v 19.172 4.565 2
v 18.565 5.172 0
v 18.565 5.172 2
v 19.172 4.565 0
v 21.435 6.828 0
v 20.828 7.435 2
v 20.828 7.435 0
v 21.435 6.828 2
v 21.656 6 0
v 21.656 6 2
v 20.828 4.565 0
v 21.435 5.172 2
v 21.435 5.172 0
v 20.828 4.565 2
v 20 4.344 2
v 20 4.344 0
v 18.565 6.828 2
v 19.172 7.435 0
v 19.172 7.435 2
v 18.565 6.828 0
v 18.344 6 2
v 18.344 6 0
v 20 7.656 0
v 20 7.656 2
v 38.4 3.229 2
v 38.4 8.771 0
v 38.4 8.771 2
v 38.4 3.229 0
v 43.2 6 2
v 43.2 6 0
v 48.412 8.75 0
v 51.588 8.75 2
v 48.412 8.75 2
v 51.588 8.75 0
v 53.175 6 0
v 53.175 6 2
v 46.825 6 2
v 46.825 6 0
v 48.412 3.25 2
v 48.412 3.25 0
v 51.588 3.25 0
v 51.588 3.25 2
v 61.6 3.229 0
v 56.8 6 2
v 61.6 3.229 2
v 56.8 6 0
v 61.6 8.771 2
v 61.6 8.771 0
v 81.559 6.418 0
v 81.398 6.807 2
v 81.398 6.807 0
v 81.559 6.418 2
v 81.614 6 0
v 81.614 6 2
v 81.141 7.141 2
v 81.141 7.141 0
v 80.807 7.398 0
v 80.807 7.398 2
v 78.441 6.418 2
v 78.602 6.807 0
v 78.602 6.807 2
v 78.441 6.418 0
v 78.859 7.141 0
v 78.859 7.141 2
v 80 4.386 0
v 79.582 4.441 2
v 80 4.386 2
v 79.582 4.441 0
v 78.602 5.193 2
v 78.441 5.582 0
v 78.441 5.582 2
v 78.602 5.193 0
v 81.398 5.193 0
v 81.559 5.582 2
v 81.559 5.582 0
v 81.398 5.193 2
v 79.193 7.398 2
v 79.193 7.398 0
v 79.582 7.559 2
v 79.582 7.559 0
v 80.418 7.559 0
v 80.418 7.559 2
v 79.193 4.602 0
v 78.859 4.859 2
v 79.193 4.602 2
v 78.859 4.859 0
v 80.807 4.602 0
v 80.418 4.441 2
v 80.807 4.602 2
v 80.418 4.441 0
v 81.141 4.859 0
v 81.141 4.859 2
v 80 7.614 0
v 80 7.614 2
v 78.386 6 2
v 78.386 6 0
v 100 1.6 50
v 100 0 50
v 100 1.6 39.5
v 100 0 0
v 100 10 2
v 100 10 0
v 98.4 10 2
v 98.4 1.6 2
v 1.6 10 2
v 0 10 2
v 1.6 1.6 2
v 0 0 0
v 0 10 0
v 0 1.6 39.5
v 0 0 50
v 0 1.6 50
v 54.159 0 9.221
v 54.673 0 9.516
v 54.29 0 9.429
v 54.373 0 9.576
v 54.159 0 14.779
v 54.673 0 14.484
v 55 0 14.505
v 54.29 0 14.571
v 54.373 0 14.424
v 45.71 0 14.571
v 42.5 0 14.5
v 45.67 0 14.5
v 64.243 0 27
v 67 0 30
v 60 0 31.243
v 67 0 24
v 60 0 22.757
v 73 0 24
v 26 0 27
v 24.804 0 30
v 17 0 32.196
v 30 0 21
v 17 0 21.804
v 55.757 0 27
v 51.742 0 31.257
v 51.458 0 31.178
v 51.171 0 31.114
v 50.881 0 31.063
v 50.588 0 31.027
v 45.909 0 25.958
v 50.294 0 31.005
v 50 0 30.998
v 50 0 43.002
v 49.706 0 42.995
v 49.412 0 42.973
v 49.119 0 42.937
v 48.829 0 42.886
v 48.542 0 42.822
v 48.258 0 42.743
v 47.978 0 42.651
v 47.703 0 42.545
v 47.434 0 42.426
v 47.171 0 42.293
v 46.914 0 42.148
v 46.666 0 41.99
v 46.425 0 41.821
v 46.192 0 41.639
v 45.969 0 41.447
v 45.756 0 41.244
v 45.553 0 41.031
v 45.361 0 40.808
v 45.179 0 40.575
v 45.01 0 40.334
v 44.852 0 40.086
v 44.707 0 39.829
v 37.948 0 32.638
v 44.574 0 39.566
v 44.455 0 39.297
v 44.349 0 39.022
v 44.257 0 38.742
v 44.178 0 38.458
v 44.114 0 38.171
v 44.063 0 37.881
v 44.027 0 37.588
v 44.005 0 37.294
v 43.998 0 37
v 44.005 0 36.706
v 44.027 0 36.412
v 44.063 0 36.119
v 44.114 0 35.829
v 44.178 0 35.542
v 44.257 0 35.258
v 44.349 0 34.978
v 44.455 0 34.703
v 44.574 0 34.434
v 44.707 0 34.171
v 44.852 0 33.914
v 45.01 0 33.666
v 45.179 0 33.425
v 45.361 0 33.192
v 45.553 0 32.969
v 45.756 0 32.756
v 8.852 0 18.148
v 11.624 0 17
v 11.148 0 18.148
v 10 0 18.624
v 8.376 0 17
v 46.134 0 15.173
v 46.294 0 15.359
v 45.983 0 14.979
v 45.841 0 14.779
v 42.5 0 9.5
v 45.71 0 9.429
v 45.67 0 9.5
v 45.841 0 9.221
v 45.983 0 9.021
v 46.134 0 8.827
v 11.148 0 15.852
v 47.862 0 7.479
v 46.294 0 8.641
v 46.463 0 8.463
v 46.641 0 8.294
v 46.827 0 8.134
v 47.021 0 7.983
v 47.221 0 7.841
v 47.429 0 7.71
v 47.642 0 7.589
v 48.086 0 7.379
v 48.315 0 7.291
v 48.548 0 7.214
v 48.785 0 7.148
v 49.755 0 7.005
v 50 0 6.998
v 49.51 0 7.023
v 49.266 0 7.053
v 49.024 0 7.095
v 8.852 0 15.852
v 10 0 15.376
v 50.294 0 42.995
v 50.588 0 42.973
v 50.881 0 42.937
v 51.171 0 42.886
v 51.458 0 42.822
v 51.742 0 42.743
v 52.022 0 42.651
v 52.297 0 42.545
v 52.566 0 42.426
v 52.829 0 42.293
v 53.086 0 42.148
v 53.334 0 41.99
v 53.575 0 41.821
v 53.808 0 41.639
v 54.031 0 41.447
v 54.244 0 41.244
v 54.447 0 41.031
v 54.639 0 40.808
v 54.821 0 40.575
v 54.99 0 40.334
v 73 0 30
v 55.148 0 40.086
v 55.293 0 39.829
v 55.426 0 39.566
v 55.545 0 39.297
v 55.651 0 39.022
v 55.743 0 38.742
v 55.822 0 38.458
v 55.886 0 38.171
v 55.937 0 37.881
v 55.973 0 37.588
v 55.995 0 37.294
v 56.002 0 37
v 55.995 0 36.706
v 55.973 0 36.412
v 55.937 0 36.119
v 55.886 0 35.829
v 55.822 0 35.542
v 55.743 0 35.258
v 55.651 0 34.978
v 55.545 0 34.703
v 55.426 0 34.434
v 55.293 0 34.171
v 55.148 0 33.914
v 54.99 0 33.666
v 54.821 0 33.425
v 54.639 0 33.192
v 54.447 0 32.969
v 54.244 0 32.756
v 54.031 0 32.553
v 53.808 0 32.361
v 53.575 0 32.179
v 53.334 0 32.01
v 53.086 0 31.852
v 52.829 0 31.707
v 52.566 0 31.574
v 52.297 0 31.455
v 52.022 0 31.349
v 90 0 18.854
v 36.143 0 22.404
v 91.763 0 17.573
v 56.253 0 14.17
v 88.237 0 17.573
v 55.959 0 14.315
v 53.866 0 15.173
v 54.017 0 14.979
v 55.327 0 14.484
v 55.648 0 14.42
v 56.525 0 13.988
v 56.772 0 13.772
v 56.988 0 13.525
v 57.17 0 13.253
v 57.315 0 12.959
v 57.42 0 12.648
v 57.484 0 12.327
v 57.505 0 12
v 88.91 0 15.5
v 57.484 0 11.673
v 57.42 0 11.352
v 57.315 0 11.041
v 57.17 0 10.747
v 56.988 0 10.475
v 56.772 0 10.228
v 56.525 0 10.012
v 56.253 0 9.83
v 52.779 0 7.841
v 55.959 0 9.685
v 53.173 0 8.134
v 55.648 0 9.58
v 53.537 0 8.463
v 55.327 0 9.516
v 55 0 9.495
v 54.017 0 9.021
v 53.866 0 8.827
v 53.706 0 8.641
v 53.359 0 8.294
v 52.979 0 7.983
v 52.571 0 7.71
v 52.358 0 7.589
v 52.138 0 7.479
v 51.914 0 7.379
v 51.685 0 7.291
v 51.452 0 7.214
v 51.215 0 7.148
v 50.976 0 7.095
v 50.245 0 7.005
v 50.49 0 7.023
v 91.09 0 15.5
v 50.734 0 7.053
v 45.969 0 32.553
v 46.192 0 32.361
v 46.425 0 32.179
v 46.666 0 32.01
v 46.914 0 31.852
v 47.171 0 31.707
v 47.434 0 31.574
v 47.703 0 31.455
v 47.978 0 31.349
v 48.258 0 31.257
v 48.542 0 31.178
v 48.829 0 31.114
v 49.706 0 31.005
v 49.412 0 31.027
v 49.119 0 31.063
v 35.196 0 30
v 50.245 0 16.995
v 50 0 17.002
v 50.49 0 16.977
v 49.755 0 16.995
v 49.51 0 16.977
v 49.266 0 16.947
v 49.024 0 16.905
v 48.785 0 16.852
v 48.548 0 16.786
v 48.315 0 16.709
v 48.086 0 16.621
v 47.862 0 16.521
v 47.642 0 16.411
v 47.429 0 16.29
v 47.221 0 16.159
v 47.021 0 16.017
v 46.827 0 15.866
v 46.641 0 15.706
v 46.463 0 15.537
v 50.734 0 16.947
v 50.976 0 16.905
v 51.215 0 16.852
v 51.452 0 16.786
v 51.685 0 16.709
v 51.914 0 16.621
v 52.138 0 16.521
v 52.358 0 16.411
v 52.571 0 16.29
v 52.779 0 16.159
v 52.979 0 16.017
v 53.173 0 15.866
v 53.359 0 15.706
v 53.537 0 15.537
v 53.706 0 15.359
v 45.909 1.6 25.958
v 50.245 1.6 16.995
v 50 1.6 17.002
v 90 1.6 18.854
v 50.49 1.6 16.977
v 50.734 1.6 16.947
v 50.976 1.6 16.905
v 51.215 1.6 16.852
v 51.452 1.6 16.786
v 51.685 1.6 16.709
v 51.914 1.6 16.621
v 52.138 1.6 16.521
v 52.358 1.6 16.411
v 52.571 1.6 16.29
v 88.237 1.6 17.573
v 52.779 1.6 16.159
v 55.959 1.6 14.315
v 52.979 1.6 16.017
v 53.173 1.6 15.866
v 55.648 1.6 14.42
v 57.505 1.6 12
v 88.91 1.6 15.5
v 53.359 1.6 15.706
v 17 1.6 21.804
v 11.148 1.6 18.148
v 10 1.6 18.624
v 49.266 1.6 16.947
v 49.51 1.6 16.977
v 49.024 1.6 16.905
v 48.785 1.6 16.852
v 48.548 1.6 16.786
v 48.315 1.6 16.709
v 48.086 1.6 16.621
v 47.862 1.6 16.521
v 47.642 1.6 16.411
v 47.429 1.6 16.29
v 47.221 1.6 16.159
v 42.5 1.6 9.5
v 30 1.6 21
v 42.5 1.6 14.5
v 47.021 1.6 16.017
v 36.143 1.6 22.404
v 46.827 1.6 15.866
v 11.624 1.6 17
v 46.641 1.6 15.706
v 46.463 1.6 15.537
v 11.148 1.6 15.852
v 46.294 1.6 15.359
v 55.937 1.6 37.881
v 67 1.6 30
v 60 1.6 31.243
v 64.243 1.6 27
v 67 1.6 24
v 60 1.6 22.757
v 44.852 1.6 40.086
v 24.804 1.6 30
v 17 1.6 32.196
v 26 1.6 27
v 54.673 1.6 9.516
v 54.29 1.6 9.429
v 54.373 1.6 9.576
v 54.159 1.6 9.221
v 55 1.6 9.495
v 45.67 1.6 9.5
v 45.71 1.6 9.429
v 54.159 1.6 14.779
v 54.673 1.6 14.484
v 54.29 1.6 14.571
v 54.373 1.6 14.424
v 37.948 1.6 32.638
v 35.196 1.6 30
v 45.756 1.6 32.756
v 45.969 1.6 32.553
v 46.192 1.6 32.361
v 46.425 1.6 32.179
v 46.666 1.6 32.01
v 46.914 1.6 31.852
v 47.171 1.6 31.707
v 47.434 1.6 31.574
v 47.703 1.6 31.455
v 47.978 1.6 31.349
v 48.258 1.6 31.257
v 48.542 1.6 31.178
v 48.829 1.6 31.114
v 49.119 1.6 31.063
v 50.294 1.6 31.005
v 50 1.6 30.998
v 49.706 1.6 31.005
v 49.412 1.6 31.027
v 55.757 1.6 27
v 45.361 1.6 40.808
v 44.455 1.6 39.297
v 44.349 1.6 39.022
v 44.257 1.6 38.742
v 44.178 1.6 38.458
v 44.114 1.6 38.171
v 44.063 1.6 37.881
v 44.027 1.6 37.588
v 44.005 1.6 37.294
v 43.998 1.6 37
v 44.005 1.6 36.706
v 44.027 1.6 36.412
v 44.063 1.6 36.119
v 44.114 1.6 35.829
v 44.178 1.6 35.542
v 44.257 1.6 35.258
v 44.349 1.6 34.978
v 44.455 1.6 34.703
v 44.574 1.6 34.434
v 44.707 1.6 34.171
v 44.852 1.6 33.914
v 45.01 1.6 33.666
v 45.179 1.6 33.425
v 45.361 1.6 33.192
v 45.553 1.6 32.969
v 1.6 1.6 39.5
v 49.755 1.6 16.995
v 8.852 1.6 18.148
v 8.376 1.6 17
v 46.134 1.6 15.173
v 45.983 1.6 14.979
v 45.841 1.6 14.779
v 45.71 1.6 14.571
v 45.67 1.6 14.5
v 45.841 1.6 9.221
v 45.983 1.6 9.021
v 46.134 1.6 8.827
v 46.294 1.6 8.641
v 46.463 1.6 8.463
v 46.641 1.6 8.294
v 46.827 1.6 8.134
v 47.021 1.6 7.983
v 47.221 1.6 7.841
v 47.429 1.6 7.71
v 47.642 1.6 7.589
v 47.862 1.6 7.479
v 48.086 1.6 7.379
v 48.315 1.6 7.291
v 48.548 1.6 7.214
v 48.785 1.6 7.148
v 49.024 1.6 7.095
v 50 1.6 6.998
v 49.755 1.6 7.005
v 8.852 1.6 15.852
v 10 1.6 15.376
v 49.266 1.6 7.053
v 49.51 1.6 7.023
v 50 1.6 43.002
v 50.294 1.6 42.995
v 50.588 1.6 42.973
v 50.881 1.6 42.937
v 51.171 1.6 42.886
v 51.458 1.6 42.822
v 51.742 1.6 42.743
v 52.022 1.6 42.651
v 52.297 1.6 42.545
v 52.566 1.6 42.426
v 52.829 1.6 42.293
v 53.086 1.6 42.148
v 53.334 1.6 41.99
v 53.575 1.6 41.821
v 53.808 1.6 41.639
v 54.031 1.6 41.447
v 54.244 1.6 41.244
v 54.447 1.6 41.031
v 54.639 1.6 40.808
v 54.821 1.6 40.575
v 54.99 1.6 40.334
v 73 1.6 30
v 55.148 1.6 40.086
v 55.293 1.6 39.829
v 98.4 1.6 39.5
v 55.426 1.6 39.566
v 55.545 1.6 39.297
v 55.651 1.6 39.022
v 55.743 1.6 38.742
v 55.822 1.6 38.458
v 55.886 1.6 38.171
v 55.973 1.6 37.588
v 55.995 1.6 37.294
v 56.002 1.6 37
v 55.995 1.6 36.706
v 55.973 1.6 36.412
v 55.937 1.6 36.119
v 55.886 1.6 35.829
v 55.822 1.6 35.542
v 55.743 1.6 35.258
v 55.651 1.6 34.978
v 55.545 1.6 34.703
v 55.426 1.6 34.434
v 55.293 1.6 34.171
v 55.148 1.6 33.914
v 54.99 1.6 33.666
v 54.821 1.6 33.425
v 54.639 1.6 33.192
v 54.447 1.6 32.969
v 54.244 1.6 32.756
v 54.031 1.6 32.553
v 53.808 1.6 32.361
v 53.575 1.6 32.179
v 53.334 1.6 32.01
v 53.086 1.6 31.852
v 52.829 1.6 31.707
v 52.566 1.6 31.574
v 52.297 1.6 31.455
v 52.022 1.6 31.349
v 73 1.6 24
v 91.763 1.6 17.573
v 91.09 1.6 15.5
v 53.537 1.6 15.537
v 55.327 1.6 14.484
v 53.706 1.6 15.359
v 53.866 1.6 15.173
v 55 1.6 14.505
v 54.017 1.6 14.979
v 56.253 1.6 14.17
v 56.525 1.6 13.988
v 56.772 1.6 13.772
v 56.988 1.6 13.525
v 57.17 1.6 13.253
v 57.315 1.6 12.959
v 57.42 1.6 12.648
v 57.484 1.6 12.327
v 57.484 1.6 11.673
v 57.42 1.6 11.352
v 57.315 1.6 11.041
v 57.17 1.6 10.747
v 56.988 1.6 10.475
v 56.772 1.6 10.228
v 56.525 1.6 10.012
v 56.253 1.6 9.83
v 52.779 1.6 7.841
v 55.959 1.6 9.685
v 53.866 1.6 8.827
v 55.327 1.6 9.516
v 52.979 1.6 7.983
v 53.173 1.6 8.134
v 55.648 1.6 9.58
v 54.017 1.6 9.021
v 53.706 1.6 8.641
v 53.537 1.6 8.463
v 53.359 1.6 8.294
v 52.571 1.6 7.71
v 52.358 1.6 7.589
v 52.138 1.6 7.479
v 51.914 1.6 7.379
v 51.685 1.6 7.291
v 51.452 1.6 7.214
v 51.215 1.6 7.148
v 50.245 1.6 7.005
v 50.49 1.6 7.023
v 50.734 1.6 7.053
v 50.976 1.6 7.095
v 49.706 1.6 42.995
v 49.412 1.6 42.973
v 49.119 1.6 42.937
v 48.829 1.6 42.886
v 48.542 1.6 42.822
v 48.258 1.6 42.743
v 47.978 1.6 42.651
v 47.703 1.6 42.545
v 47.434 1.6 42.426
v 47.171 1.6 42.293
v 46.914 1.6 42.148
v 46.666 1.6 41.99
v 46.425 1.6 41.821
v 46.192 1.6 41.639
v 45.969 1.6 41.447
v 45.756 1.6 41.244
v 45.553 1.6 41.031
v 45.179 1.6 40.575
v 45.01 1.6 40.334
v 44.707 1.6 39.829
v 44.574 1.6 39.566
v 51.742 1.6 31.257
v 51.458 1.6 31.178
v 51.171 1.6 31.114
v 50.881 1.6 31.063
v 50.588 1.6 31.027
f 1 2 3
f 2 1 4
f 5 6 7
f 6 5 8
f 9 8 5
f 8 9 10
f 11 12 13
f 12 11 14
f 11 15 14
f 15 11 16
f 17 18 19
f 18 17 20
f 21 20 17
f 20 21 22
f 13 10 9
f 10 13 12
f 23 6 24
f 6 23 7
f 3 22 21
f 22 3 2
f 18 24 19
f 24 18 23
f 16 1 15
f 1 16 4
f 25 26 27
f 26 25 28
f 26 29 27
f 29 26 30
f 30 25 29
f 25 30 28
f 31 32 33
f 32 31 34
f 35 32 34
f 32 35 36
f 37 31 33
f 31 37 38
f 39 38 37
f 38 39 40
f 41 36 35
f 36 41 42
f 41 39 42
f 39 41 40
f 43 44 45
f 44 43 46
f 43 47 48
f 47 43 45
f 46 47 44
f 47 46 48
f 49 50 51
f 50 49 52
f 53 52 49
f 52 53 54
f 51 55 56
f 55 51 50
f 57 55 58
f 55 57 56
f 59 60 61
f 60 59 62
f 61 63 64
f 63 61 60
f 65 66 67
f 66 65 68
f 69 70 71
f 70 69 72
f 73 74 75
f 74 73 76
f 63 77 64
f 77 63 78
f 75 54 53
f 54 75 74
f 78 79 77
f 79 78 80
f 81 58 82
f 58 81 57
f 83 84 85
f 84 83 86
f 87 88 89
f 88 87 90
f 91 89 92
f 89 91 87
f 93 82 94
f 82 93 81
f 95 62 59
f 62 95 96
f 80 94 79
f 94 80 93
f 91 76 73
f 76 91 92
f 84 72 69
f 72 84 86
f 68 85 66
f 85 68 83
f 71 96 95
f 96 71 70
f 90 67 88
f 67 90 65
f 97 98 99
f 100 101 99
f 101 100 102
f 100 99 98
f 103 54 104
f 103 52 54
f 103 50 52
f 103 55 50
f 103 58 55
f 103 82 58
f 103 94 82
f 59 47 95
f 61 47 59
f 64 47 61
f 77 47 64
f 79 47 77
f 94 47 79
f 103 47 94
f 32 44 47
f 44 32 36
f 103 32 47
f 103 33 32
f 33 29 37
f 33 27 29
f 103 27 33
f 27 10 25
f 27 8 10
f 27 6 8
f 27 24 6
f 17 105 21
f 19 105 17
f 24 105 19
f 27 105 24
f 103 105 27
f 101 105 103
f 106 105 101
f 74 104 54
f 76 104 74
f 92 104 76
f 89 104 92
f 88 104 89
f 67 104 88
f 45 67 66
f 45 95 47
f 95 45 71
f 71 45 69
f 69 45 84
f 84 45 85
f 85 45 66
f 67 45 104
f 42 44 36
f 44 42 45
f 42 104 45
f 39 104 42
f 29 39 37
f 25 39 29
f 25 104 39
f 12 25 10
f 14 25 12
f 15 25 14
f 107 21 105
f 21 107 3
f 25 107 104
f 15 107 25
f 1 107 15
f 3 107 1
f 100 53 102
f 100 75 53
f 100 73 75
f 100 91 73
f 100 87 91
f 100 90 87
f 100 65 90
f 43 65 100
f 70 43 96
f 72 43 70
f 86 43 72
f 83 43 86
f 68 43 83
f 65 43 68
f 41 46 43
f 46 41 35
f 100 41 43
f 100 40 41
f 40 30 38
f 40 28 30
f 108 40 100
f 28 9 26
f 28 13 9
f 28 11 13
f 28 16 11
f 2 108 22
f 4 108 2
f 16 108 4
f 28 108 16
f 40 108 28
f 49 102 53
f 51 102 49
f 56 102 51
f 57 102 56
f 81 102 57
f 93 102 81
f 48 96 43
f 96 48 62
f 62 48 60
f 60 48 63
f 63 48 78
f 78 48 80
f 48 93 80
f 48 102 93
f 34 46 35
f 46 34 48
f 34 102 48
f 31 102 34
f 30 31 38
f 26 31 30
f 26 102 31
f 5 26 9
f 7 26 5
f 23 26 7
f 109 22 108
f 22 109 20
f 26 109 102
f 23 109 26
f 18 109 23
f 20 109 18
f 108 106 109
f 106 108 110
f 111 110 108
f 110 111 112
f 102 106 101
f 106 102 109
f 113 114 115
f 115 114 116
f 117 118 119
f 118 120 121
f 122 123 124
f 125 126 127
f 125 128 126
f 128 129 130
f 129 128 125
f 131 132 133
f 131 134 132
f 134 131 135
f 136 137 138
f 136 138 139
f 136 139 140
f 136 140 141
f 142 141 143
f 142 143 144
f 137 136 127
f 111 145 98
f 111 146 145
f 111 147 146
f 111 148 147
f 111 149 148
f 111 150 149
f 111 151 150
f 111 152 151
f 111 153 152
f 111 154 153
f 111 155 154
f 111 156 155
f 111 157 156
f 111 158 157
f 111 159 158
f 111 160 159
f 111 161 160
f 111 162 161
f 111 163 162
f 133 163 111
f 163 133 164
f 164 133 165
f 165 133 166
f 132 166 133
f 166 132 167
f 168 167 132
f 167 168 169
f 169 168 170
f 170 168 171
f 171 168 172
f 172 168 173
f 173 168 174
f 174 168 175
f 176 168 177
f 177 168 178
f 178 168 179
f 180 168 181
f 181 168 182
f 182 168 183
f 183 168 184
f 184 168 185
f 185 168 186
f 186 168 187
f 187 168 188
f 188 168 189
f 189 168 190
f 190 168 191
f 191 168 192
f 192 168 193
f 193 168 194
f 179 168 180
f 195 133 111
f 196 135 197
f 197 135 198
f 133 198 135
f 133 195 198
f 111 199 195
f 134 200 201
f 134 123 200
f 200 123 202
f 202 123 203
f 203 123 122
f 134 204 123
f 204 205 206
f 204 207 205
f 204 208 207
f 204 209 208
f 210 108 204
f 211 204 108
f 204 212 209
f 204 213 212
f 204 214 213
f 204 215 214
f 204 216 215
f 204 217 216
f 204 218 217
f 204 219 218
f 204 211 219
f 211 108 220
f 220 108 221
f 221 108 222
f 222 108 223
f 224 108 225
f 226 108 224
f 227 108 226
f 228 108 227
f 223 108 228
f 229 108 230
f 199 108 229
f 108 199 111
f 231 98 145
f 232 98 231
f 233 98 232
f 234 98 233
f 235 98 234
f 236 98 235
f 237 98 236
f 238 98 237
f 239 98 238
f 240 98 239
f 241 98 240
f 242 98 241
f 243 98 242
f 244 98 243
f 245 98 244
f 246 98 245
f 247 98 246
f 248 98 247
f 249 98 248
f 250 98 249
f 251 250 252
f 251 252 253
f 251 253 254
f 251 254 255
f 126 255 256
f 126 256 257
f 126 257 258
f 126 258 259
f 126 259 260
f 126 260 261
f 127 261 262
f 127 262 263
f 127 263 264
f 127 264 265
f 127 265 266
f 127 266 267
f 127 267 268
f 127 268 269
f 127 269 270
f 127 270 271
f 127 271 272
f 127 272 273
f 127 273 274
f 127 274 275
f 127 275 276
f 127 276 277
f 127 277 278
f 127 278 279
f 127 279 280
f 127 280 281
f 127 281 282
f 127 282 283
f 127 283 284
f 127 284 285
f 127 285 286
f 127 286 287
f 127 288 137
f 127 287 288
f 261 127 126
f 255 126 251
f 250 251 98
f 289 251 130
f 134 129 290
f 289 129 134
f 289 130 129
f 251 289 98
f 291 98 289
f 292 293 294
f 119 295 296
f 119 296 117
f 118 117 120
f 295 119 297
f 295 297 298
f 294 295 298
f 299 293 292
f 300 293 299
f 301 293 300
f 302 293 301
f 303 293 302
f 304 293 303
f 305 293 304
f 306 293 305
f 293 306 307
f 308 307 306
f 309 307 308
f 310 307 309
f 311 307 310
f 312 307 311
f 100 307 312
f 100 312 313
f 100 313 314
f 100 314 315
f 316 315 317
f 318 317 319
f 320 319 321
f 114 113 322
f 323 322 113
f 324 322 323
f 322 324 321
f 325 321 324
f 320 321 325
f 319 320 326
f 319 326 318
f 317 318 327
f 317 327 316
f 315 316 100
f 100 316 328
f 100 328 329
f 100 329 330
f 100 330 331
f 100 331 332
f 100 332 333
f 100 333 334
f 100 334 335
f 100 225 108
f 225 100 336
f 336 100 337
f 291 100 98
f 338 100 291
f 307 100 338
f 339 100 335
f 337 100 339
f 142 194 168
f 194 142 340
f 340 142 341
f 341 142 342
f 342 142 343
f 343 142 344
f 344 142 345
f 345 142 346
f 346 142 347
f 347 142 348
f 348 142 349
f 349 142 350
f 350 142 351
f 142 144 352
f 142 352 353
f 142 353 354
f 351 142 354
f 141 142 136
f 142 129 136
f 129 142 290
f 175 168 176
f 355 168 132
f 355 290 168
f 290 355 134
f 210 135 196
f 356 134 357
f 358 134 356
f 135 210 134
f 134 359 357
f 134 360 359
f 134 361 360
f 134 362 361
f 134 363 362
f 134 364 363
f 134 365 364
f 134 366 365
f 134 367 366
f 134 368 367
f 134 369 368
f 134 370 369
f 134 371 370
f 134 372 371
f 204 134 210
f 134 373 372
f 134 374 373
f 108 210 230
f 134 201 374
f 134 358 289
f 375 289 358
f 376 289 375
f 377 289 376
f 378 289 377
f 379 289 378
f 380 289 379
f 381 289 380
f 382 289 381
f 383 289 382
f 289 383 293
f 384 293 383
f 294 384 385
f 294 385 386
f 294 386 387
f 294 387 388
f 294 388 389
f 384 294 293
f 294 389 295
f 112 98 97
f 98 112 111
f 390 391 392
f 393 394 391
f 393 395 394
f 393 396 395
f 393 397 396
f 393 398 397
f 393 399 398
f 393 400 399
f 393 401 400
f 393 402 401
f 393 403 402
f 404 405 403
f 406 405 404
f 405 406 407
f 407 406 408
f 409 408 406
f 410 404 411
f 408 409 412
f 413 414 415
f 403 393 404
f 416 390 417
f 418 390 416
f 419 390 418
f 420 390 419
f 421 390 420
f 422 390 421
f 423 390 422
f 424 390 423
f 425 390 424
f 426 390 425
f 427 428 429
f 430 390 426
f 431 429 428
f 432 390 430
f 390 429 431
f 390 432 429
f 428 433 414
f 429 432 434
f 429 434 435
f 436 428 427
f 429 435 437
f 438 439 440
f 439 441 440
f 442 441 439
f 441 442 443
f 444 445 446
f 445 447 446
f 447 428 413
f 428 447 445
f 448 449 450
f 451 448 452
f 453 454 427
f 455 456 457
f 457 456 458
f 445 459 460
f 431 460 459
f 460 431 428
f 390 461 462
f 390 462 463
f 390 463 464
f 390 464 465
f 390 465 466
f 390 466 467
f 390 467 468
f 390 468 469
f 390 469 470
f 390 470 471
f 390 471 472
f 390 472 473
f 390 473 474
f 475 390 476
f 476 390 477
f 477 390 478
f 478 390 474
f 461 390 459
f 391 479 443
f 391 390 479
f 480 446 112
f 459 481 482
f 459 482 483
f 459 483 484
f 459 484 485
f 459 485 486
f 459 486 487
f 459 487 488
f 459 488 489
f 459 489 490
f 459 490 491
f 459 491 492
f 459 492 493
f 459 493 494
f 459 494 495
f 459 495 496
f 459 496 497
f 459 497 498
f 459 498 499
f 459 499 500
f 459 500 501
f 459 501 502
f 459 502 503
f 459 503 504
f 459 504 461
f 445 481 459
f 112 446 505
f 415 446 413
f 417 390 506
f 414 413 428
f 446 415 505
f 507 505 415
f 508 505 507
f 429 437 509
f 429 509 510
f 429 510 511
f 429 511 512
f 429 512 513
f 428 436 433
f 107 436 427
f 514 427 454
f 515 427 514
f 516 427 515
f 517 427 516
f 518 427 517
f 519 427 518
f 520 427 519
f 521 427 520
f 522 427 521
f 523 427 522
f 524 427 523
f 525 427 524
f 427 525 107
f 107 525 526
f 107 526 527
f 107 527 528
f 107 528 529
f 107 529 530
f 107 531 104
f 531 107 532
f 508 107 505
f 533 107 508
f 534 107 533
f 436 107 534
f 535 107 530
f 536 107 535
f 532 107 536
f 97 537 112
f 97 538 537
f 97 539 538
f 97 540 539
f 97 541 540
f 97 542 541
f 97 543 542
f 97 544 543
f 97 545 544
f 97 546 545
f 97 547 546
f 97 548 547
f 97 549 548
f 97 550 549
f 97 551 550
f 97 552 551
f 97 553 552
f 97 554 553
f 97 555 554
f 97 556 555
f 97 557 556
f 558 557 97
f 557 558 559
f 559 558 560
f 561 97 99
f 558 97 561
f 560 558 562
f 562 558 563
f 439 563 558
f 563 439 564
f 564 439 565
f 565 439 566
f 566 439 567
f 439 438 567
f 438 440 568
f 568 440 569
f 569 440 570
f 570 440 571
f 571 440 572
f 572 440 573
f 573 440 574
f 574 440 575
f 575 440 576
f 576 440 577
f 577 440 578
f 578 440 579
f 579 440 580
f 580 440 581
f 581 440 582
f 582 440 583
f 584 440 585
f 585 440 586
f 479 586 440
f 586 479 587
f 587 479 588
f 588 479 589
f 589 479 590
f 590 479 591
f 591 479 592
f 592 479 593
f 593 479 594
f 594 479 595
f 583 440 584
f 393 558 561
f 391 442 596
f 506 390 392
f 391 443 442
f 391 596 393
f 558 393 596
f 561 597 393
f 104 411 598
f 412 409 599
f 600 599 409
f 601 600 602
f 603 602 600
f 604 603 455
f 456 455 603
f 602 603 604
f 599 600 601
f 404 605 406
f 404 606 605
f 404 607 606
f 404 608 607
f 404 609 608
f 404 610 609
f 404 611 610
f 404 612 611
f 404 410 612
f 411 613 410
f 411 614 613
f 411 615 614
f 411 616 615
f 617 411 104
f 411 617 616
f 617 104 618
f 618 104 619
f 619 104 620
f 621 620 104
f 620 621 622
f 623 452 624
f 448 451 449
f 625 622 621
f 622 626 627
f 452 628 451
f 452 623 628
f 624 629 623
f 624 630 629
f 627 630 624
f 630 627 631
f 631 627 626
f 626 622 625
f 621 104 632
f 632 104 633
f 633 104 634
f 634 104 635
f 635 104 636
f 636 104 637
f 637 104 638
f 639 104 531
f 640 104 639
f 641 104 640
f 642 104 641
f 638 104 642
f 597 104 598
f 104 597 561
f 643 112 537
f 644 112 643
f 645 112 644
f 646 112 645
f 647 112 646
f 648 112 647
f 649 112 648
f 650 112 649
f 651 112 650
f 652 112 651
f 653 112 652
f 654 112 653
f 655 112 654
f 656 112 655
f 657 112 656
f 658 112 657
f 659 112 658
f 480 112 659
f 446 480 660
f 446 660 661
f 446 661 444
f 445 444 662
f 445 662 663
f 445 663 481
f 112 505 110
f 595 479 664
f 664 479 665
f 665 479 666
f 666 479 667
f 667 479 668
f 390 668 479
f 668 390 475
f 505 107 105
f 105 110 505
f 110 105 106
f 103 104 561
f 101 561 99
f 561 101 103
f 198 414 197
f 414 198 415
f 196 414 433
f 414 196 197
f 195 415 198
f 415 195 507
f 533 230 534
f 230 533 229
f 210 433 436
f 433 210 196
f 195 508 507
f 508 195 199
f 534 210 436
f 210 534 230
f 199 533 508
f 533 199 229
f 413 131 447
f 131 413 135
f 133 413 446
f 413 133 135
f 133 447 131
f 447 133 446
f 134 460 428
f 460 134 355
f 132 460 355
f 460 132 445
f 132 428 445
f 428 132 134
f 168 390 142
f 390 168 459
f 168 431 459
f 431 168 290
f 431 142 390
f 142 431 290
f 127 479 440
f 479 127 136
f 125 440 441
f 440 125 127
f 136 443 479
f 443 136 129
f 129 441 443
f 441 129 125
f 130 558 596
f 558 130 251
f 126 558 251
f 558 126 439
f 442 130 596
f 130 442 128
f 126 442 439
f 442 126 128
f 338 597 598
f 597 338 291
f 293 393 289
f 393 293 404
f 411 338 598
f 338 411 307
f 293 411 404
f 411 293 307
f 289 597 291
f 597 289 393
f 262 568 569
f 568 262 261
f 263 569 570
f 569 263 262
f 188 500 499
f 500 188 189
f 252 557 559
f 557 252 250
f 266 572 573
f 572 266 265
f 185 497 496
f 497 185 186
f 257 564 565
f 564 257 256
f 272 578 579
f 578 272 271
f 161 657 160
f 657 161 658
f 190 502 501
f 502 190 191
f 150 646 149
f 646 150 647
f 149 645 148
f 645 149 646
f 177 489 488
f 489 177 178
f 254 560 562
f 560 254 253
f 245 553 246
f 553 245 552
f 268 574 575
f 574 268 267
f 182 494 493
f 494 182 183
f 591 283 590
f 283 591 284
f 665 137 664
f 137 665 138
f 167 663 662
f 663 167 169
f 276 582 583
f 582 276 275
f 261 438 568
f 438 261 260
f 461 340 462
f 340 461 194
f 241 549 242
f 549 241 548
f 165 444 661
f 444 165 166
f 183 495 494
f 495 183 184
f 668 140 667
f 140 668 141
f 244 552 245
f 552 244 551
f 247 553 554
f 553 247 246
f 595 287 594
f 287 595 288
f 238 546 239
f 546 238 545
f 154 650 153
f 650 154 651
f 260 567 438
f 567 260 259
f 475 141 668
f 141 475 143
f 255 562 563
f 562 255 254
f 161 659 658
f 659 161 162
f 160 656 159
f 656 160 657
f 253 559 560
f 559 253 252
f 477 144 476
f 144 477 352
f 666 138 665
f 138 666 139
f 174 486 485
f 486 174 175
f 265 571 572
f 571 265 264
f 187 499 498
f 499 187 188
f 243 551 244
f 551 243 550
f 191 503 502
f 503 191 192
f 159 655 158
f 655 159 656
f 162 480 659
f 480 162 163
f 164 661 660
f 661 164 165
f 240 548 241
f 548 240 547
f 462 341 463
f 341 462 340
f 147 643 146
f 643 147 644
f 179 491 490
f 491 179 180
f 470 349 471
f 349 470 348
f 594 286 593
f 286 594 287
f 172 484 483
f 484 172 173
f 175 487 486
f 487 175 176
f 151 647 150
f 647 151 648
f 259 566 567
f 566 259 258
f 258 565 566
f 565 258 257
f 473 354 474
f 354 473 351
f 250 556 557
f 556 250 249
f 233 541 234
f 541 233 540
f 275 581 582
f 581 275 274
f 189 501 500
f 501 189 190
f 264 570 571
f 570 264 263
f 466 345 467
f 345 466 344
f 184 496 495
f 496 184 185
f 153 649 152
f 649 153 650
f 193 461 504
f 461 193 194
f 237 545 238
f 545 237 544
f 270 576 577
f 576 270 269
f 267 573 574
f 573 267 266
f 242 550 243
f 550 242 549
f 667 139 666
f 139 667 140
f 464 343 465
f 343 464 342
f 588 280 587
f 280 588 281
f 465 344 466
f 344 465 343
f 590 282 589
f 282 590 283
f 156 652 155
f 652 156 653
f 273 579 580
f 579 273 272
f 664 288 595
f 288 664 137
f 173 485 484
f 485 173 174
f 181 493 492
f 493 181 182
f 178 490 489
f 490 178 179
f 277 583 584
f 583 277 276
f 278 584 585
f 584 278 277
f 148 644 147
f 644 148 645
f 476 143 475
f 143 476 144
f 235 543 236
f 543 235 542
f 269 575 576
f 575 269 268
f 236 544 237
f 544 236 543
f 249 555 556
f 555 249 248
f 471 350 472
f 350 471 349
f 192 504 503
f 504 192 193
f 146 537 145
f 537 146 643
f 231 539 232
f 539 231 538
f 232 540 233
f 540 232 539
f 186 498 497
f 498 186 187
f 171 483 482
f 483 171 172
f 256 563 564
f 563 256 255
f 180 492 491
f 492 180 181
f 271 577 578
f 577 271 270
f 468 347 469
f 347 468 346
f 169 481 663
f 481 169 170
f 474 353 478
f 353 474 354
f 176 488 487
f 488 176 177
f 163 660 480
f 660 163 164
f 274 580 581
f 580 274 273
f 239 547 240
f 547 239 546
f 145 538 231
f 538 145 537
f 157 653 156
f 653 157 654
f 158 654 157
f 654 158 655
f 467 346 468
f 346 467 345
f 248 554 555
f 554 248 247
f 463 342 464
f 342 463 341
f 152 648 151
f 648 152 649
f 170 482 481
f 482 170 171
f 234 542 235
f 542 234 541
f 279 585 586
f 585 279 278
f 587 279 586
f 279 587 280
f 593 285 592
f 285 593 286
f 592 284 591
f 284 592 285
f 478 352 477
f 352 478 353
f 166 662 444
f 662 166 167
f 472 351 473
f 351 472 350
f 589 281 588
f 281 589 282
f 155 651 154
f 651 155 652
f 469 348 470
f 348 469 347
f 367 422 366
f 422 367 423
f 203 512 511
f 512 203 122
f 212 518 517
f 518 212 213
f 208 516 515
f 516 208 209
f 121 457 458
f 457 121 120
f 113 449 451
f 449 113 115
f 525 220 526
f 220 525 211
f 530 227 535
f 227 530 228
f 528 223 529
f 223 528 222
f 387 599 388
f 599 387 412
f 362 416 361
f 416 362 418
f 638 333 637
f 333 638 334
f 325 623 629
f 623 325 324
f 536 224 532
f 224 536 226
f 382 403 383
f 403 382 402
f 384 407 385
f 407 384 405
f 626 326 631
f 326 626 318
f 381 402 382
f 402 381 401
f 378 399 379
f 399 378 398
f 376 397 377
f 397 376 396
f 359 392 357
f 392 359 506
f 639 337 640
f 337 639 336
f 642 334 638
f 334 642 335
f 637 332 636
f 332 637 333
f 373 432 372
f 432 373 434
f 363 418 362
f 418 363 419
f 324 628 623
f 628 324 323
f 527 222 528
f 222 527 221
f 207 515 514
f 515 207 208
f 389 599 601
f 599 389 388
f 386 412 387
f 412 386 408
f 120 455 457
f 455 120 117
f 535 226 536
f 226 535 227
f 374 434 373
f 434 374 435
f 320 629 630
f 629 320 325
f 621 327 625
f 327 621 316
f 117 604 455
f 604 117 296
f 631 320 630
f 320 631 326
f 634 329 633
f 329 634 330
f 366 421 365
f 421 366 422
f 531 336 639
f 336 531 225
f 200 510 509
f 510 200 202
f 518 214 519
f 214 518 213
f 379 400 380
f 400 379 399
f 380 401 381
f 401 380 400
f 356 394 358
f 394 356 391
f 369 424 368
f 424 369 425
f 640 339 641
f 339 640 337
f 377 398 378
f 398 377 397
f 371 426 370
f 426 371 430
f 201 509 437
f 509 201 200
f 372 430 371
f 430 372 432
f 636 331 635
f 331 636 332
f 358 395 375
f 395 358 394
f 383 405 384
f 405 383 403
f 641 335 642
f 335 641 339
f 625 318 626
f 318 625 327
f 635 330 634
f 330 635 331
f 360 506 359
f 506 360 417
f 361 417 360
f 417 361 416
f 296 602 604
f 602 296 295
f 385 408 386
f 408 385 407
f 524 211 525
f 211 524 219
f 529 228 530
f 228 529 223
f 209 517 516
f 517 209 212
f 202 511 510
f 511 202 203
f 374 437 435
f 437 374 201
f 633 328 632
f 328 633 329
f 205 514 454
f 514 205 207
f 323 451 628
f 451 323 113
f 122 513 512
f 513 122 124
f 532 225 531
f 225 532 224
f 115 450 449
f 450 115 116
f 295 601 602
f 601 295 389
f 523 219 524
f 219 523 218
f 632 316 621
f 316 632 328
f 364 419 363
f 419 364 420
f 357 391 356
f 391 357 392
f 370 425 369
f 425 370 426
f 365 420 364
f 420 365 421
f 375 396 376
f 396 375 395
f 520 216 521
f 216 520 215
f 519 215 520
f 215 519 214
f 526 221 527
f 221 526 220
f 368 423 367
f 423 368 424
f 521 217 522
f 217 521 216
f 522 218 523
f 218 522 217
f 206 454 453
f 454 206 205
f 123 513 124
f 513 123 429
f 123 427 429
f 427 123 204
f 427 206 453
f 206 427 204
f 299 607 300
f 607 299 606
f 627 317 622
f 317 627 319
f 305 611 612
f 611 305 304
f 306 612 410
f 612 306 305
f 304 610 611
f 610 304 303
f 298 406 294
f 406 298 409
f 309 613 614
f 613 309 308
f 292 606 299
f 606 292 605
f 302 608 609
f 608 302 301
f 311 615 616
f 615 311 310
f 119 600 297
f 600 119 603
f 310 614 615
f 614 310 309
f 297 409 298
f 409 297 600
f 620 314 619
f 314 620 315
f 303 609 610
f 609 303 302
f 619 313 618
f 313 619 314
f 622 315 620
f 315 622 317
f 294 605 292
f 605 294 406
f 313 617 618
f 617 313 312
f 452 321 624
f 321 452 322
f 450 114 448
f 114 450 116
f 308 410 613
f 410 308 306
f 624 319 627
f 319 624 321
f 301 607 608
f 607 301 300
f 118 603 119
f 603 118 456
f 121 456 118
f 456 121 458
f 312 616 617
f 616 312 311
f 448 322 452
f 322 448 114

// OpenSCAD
/****************************************************************************************************************************
*
* Description.
* ============
* A Generic and parametered 'Mounting Bracket with Supports' object
* to be used either separately or as part of a greater model.
*
* How to better describe the object provided by this module?
* The best I can come up with is this:
*
* Open the module in an empty OpenSCAD session.
* It will make a demo object with some decent default values.
* Turn it around and study it.
* Decide if it's of any use in your project(s).
*
*
* Author: Stafr Gotar
*
* The latest version can be found at:
* https://github.com/StafrGotar/MountingBracketWithSupports
*
*
* How to use it.
* ==============
* If you 'include' this module into your OpenSCAD file, the default demo object will be produced.
* This is probably not what you want long term.
* But it's a good way to visualize what the module can provide.
* If you 'use' this module from your OpenSCAD file, then the module will *not* be instantiated,
* but you must instantiate it from your own code.
* That's when you'll have to start studying the parameters and their influence on the Mounting Bracket object.
* Tip: Take advantage of named parameters. It'll make your own calling code easier to read.
*
*
* XYZ-orientation.
* ================
* The object will allways be placed in the first quadrant, with what could be called
* "the lower left corner" on the origin at Z=0 and stretching "to the right" into X.
*
* The face-plate wall, where we imagine to attach 'things' to the bracket, will be turned 'forward'
* into a default camera position.
*
* By default, no holes will be made either in the footer or in the face-plate wall.
* Holes must be explicitly requested in the calling parameters.
*
*
* Parameters.
* ===========
* l => Length. That's a lower case 'L'. Size from origin along the X axis.
*      Must be greater than zero.
*      Must be at least twice the wall_thickness (see below).
*
* w => Width. Size from the origin along the Y axis, as measured on Z=0.
*      Must be greater than zero.
*
* h => Height. Size above Z=0.
*      Must be a positive number.
*      If 'h' is exactly zero, then a gentle reminder warning is issued in OpenSCAD's monitor and no bracket is created.
*      See that as a possibility to temporary suppress the creation of the Bracket object.
*
* wall_thickness => The thickness of the face-plate wall and the two triangular supports.
*                   Must be greater than zero.
*
* wall_holes_xzd_matrix => A matrix, a vector of vectors.
*                          For each hole to punch through the face wall, a vector of 3 to 5 elements [x,z,d,fn,rot].
*                          Details:
*                          'x' position on the face-plate wall, mandatory
*                          'z' position on the face-plate hole, mandatory
*                          'd' hole diameter, mandatory, may be zero for no hole, but can't be negative
*                          'fn' fragment number for hole (like $fn), optional
*                          'rot' degrees of rotation of the hole (useful for triangular or square holes), optional
*
*                          Three different holes at given positions could be provided as:
*                          wall_holes_xzd_matrix=[ [10,15,3], [50,25,10], [90,15,3] ]
*
*                          Default value is 'no holes', i.e. an empty matrix.  (A vector of no vectors.)
*                          Like this: wall_holes_xzd_matrix=[]
*
* footer_thickness => The thickness of the footer. If set to zero, then no footer is produced.
*                     May not be negative.
*                     A footer makes sense for instance if the Mounting Bracket is going to be 3D-printed as a separate
*                     part and then bolted to some 'main object' of yours.
*                     If the Mounting Bracket will be 3D-printed together with some 'main object', in one combined print,
*                     then the footer can be omitted by setting its thickness to zero.
*
* footer_holes_xyd_matrix => A matrix, a vector of vectors.
*                            For each mounting hole to punch through the footer, a vector of 3 to 5 elements [x,y,d,fn,rot].
*                            Details:
*                            'x' position from the origin, mandatory
*                            'y' position from the origin, mandatory
*                            'd' hole diameter, mandatory, may be zero for no hole, but can't be negative
*                            'fn' fragment number for hole (like $fn), optional
*                            'rot' degrees of rotation of the hole (useful for triangular or square holes), optional
*
*                            Three holes for M3 screws at given positions could be provided as:
*                            footer_holes_xyd_matrix=[ [20,6,3.2], [45,6,3.2], [80,6,3.2] ]
*
*                            Default value is 'no footer holes', i.e. an empty matrix. (A vector of no vectors.)
*                            Like this: footer_holes_xyd_matrix=[]
*
* verbosity => A positive integer value to request 'debug' information to be displayed in OpenSCAD's monitor
*              during the instantiation of the object.
*              Default is '0' (zero), which is equal to 'quiet'.
*              Currently, the highest value is '2'.
*
* $fn => The module will listen to the global $fn variable, if it's set.
*        For all holes in the bracket where the caller has *not* provided an explicit 'fn' value, the global $fn will be used.
*        Where hole-specific 'fn' values are given, those will be used.
*        If no $fn is set and no hole-specific 'fn' is set, then the default 'fn' value of 8 will be used.
*
****************************************************************************************************************************/

/*
 The external calling interface. Reasonable default values are set.
 By default, there are no mounting holes in the footer and no holes in the face-plate wall.
*/
module Mounting_Bracket_With_Supports(l=100,
                                          w=10,
                                          h=50,
                                          wall_thickness=1,
                                          wall_holes_xzd_matrix=[],
                                          footer_thickness=1,
                                          footer_holes_xyd_matrix=[],
                                          verbosity=0)
{
//  Simple verification of some input variables.
assert(l > 0,"You must provide a positive 'X' length greater than zero!");
assert(w > 0,"You must provide a positive 'Y' width greater than zero!");
assert(h >= 0,"Height (h) may not be negative. Set to zero to suppress instantiation of the Mounting Bracket.");
assert(wall_thickness > 0,"Wall Thickness must be > 0.");
assert(footer_thickness >= 0,"Footer Thickness may not be negative. Set to zero to suppress the Footer.");
assert(h >= footer_thickness,"Footer Thickness may not be > total height (h).");
assert(l >+ (wall_thickness*2),"The length (l) must be at least 2 times the wall thickness.");

pass_through=0.001; // To avoid having a hole flush with a surface.
height_ratio=0.75;  // Could become a parameter one day.

// Calling the original 'cylinder()' without a valid '$fn' makes a cylinder with 8 fragments.
// Calling the original 'cylinder()' with a '$fn < 3' makes a triangle shaped cylinder.

default_fn=8; // In case it's missing or holds an 'illegal' value.
minimum_fn=3; // A triangular cylinder is made from the smallest possible number of fragments.

// Private module, 'protected' by scope.
module local_support_wall_triangle(h=30,w=10,t=wall_thickness)
{
linear_extrude(height=t)
polygon(points=[ [0,0], [w,0], [0,h] ]);
}

// Private module, 'protected' by scope.
module local_cylinder_hole(height,radius,fn)
{
// Outer (circumscribed) cylinder polygon.
// https://en.wikibooks.org/wiki/OpenSCAD_User_Manual/undersized_circular_objects
fudge = 1/cos(180/fn);
cylinder(h=height,r=radius*fudge,$fn=fn,center=false);
}

if((h-footer_thickness) <= 0)
{
    echo(str("WARNING: Mounting Bracket has no height over its footer. No Mounting Bracket will be produced."));
}
else
{
    // Union between the footer and the face-plate (with supports).
    union()
    {
        // The footer.
        if (footer_thickness > 0)
        {
            // If footer is requested, i.e. thicker than 0.
            difference()
            {
                // Create the footer itself.
                cube([l,w,footer_thickness]);
                // If screwholes are requested for the footer, punch the holes.
                for(hole=footer_holes_xyd_matrix)
                {
                    // Verify the footer hole specification.
                    assert(!is_undef(hole[2]),
                           str("Footer hole diameter is mandatory."));
                    assert(hole[2] >= 0, // If zero, cylinder() will not create any object. I.e. no hole.
                           str("Footer hole diameter (",
                               hole[2],
                               ") may not be negative."));
                    // Verify that no footer hole becomes 'invisible' by being put beyond the footer area.
                    assert(hole[0] >= 0,
                           str("Footer hole 'x' (",
                               hole[0],
                               ") may not be negative."));
                    assert(hole[0] < l,
                           str("Footer hole 'x' (",
                               hole[0],
                               ") may not be set beyond bracket length 'l' (",
                               l,")."));
                    if(verbosity > 0)
                    {
                        // Only upon explicit request.
                        echo(str("Footer hole vector: [",hole[0], // X pos.
                                 ",",hole[1],  // Y pos.
                                 ",",hole[2],  // Diam.
                                 ",",hole[3],  // fn.
                                 ",",hole[4],  // Rotate.
                                 "]."));
                    }
                    footer_cylinder_fn =
                        is_undef(hole[3]) || !is_num(hole[3]) ?  // Nothing valid specified ?
                        is_undef($fn) ? default_fn :             // Missing $fn, take default, else look for $fn.
                        $fn >= minimum_fn ? $fn : minimum_fn :   // Too small $fn, take minimum.
                        hole[3] ;                                // Take the specified value.
                    if(verbosity > 1)
                    {
                        echo(str("Footer hole fn: ",footer_cylinder_fn));
                    }
                    // Did the caller request we rotate the footer hole? (Useful for triangular, square, etc. holes.)
                    footer_hole_rot =
                        is_undef(hole[4]) || !is_num(hole[4]) ?
                        0 :                                      // Not given or invalid, so ignore.
                        hole[4];                                 // Use it.
                    if(verbosity > 1)
                    {
                        echo(str("Footer hole rotate: ",footer_hole_rot));
                    }
                    translate([hole[0],hole[1],-pass_through])
                    rotate([0,0,footer_hole_rot])            // As per caller's request.
                    local_cylinder_hole(height=footer_thickness+(2*pass_through),
                                        radius=hole[2]/2,
                                        fn=footer_cylinder_fn);
                }
            }
        }
        // The face-plate wall.
        translate([0,0,footer_thickness])
        // Lift the wall and the supports to give z-place for the footer.
        // If footer_thickness == 0, then the lift becomes null.
        difference()
        {
            // Build the face-plate...
            union()
            {
                // The main 'standing' wall, i.e. the face-plate.
                cube([l,
                      wall_thickness,
                      h-footer_thickness]); // If there was a footer, we'll have to reduce the face-plate height accordingly.
                // Left triangular support.
                translate([0,wall_thickness,0]) // So the support doesn't 'enter', becomes part of,  the main wall.
                rotate([0,0,90]) // Twist around Z.
                rotate([90,0,0]) // Stand up.
                local_support_wall_triangle(h=h*height_ratio,
                                            w=w-wall_thickness);
                // Right triangular support.
                translate([l-wall_thickness,  // Off to the right.
                                              wall_thickness,  // So it doesn't 'enter' the main wall.
                                              0])
                rotate([0,0,90]) // Twist around Z.
                rotate([90,0,0]) // Stand up.
                local_support_wall_triangle(h=h*height_ratio,
                                            w=w-wall_thickness);
            }
            // Remove any requested holes from the face-plate wall.
            for(wall_hole=wall_holes_xzd_matrix)
            {
                // Verify the wall hole specification.
                assert(!is_undef(wall_hole[2]),
                       str("Wall hole diameter is mandatory."));
                assert(wall_hole[2] >= 0, // If zero, cylinder() will not create any object. I.e. no hole.
                       str("Wall hole diameter (",
                           wall_hole[2],
                           ") may not be negative."));
                // Verify that no wall hole becomes 'invisible' by being put beyond the wall area.
                assert(wall_hole[0] >= 0,
                       str("Wall hole 'x' (",
                           wall_hole[0],
                           ") may not be negative."));
                assert(wall_hole[0] < l,
                       str("Wall hole 'x' (",
                           wall_hole[0],
                           ") may not be set beyond bracket length 'l' (",
                           l,")."));
                if(verbosity > 0)
                {
                    // Only upon explicit request.
                    echo(str("Wall hole vector: [",wall_hole[0],
                             ",",wall_hole[1],
                             ",",wall_hole[2],
                             ",",wall_hole[3],
                             ",",wall_hole[4],
                             "]."));
                }
                wall_cylinder_fn =
                    is_undef(wall_hole[3]) || !is_num(wall_hole[3]) ? // Nothing valid specified ?
                    is_undef($fn) ? default_fn :                      // Missing $fn, take default, else look for $fn.
                    $fn >= minimum_fn ? $fn : minimum_fn :            // Too small $fn, take minimum.
                    wall_hole[3] ;                                    // Take the specified value.
                if(verbosity > 1)
                {
                    echo(str("Wall hole fn: ",wall_cylinder_fn));
                }
                // Did the caller request we rotate the wall hole? (Useful for triangular, square, etc. holes.)
                wall_hole_rot =
                    is_undef(wall_hole[4]) || !is_num(wall_hole[4]) ?
                    0 :                                               // Not given or invalid, so ignore.
                    wall_hole[4];                                     // Use it.
                if(verbosity > 1)
                {
                    echo(str("Wall hole rotate: ",wall_hole_rot));
                }
                translate([wall_hole[0],wall_thickness+pass_through,wall_hole[1]])
                rotate([0,wall_hole_rot,0])                       // As per caller's request.
                rotate([90,0,0])                                  // Put the cylinder horizontal, through the wall.
                local_cylinder_hole(height=wall_thickness+(2*pass_through),
                                    radius=wall_hole[2]/2,
                                    fn=wall_cylinder_fn);
            }
        }
    }
}
}


/****************************************************************************************************************************
 Demo driver, activated by 'include <StafrGotar/bracket/MountingBracketWithSupports.scad>'.
 Specify 'use <StafrGotar/bracket/MountingBracketWithSupports.scad>' to suppress the demo object.

 This demo driver call is explicitly written as a very long list of arguments
 to permit explicit comments on the example parameters.

 Values are here hardcoded, but the caller will most likely create the dimensions and positions dynamically.

 Lot's of examples for creating holes in the bracket are provided, some pretty odd ones.
****************************************************************************************************************************/
Mounting_Bracket_With_Supports(l=100,  // X length.
                               h=50,   // Z height.
                               wall_thickness=1.6,
                               wall_holes_xzd_matrix=[ [10,    // X position on the face-plate wall.
                                       15,    // Z position on the face-plate wall.
                                       3,     // Diameter.
                                       8,     // Fragment number (fn) for this hole.
                                       0],    // Rotate degrees +/- (0 - 259)

                                       [20,    // X pos.
                                        25,    // Z pos.
                                        6],    // Diameter. (No fn specified, so undef. No rotate, so undef.)

                                       [30,    // X pos.
                                        25,    // Z pos.
                                        6,     // Diameter.
                                        3,     // Fragments fn. Explicit triangle.
                                        90],   // Rotate 90 degrees.

                                       [40,    // X pos.
                                        25,    // Z pos.
                                        6,     // Diameter.
                                        3,     // Fragments fn. Explicit triangle.
                                        -110], // Rotate -110 degrees.

                                       [60,    // X pos.
                                       25,    // Z pos.
                                       6,     // Diameter.
                                       4],    // Fragments fn. Explicit square.

                                       [70,    // X pos.
                                       25,    // Z pos.
                                       6,     // Diameter.
                                       4,     // Fragments fn. Explicit square.
                                       45],   // Rotate 45 degrees.

                                       [90,    // X.
                                       15,    // Z.
                                       3,     // D.
                                       5,     // fn.
                                       -90],  // Can rotate positive or negative.

                                       // A 'round' hole. No need to rotate a round hole.
                                       [50,
                                       35,
                                       12,
                                       128], // fn=128, Smooth finish.

                                       // Combine three holes to make an oddly shaped hole.
                                       [50,10,10,128], // A round hole.
                                       [45,10,5,4,45], // Rotate a square 45 degrees.
                                       [55,10,5,48]    // Given 48 fractions but no rotate.
                                       ],
                               footer_thickness=2,
                               footer_holes_xyd_matrix=[ [20,     // X position on footer.
                               6,      // Y position on footer.
                               3.2,    // Hole Diameter.
                               12,     // Fragment number (fn) for this footer hole.
                               undef], // Rotate degrees.

                               // A hole with no fn, will become triangular since no $fn exists.
                               [40,
                               6,
                               3.2], // Diameter. No fn, so undef. No rotate, so undef.

                               // A hexagonal hole.
                               [50,
                               6,
                               5.5,
                               6],  // Hexagonal.

                               // A triangular hole, but rotated 180 degrees.
                               [60,
                               6,
                               3.2,
                               3,     // fn=3 makes triangular.
                               180],  // Rotate 180 degrees.

                               [80,
                               6,
                               3.2,
                               24,
                               0]    // Rotate zero degrees.
                               ],
                               verbosity=2); // Could add $fn here, to be used when no specific 'fn' is given for a hole.


// EOF.
